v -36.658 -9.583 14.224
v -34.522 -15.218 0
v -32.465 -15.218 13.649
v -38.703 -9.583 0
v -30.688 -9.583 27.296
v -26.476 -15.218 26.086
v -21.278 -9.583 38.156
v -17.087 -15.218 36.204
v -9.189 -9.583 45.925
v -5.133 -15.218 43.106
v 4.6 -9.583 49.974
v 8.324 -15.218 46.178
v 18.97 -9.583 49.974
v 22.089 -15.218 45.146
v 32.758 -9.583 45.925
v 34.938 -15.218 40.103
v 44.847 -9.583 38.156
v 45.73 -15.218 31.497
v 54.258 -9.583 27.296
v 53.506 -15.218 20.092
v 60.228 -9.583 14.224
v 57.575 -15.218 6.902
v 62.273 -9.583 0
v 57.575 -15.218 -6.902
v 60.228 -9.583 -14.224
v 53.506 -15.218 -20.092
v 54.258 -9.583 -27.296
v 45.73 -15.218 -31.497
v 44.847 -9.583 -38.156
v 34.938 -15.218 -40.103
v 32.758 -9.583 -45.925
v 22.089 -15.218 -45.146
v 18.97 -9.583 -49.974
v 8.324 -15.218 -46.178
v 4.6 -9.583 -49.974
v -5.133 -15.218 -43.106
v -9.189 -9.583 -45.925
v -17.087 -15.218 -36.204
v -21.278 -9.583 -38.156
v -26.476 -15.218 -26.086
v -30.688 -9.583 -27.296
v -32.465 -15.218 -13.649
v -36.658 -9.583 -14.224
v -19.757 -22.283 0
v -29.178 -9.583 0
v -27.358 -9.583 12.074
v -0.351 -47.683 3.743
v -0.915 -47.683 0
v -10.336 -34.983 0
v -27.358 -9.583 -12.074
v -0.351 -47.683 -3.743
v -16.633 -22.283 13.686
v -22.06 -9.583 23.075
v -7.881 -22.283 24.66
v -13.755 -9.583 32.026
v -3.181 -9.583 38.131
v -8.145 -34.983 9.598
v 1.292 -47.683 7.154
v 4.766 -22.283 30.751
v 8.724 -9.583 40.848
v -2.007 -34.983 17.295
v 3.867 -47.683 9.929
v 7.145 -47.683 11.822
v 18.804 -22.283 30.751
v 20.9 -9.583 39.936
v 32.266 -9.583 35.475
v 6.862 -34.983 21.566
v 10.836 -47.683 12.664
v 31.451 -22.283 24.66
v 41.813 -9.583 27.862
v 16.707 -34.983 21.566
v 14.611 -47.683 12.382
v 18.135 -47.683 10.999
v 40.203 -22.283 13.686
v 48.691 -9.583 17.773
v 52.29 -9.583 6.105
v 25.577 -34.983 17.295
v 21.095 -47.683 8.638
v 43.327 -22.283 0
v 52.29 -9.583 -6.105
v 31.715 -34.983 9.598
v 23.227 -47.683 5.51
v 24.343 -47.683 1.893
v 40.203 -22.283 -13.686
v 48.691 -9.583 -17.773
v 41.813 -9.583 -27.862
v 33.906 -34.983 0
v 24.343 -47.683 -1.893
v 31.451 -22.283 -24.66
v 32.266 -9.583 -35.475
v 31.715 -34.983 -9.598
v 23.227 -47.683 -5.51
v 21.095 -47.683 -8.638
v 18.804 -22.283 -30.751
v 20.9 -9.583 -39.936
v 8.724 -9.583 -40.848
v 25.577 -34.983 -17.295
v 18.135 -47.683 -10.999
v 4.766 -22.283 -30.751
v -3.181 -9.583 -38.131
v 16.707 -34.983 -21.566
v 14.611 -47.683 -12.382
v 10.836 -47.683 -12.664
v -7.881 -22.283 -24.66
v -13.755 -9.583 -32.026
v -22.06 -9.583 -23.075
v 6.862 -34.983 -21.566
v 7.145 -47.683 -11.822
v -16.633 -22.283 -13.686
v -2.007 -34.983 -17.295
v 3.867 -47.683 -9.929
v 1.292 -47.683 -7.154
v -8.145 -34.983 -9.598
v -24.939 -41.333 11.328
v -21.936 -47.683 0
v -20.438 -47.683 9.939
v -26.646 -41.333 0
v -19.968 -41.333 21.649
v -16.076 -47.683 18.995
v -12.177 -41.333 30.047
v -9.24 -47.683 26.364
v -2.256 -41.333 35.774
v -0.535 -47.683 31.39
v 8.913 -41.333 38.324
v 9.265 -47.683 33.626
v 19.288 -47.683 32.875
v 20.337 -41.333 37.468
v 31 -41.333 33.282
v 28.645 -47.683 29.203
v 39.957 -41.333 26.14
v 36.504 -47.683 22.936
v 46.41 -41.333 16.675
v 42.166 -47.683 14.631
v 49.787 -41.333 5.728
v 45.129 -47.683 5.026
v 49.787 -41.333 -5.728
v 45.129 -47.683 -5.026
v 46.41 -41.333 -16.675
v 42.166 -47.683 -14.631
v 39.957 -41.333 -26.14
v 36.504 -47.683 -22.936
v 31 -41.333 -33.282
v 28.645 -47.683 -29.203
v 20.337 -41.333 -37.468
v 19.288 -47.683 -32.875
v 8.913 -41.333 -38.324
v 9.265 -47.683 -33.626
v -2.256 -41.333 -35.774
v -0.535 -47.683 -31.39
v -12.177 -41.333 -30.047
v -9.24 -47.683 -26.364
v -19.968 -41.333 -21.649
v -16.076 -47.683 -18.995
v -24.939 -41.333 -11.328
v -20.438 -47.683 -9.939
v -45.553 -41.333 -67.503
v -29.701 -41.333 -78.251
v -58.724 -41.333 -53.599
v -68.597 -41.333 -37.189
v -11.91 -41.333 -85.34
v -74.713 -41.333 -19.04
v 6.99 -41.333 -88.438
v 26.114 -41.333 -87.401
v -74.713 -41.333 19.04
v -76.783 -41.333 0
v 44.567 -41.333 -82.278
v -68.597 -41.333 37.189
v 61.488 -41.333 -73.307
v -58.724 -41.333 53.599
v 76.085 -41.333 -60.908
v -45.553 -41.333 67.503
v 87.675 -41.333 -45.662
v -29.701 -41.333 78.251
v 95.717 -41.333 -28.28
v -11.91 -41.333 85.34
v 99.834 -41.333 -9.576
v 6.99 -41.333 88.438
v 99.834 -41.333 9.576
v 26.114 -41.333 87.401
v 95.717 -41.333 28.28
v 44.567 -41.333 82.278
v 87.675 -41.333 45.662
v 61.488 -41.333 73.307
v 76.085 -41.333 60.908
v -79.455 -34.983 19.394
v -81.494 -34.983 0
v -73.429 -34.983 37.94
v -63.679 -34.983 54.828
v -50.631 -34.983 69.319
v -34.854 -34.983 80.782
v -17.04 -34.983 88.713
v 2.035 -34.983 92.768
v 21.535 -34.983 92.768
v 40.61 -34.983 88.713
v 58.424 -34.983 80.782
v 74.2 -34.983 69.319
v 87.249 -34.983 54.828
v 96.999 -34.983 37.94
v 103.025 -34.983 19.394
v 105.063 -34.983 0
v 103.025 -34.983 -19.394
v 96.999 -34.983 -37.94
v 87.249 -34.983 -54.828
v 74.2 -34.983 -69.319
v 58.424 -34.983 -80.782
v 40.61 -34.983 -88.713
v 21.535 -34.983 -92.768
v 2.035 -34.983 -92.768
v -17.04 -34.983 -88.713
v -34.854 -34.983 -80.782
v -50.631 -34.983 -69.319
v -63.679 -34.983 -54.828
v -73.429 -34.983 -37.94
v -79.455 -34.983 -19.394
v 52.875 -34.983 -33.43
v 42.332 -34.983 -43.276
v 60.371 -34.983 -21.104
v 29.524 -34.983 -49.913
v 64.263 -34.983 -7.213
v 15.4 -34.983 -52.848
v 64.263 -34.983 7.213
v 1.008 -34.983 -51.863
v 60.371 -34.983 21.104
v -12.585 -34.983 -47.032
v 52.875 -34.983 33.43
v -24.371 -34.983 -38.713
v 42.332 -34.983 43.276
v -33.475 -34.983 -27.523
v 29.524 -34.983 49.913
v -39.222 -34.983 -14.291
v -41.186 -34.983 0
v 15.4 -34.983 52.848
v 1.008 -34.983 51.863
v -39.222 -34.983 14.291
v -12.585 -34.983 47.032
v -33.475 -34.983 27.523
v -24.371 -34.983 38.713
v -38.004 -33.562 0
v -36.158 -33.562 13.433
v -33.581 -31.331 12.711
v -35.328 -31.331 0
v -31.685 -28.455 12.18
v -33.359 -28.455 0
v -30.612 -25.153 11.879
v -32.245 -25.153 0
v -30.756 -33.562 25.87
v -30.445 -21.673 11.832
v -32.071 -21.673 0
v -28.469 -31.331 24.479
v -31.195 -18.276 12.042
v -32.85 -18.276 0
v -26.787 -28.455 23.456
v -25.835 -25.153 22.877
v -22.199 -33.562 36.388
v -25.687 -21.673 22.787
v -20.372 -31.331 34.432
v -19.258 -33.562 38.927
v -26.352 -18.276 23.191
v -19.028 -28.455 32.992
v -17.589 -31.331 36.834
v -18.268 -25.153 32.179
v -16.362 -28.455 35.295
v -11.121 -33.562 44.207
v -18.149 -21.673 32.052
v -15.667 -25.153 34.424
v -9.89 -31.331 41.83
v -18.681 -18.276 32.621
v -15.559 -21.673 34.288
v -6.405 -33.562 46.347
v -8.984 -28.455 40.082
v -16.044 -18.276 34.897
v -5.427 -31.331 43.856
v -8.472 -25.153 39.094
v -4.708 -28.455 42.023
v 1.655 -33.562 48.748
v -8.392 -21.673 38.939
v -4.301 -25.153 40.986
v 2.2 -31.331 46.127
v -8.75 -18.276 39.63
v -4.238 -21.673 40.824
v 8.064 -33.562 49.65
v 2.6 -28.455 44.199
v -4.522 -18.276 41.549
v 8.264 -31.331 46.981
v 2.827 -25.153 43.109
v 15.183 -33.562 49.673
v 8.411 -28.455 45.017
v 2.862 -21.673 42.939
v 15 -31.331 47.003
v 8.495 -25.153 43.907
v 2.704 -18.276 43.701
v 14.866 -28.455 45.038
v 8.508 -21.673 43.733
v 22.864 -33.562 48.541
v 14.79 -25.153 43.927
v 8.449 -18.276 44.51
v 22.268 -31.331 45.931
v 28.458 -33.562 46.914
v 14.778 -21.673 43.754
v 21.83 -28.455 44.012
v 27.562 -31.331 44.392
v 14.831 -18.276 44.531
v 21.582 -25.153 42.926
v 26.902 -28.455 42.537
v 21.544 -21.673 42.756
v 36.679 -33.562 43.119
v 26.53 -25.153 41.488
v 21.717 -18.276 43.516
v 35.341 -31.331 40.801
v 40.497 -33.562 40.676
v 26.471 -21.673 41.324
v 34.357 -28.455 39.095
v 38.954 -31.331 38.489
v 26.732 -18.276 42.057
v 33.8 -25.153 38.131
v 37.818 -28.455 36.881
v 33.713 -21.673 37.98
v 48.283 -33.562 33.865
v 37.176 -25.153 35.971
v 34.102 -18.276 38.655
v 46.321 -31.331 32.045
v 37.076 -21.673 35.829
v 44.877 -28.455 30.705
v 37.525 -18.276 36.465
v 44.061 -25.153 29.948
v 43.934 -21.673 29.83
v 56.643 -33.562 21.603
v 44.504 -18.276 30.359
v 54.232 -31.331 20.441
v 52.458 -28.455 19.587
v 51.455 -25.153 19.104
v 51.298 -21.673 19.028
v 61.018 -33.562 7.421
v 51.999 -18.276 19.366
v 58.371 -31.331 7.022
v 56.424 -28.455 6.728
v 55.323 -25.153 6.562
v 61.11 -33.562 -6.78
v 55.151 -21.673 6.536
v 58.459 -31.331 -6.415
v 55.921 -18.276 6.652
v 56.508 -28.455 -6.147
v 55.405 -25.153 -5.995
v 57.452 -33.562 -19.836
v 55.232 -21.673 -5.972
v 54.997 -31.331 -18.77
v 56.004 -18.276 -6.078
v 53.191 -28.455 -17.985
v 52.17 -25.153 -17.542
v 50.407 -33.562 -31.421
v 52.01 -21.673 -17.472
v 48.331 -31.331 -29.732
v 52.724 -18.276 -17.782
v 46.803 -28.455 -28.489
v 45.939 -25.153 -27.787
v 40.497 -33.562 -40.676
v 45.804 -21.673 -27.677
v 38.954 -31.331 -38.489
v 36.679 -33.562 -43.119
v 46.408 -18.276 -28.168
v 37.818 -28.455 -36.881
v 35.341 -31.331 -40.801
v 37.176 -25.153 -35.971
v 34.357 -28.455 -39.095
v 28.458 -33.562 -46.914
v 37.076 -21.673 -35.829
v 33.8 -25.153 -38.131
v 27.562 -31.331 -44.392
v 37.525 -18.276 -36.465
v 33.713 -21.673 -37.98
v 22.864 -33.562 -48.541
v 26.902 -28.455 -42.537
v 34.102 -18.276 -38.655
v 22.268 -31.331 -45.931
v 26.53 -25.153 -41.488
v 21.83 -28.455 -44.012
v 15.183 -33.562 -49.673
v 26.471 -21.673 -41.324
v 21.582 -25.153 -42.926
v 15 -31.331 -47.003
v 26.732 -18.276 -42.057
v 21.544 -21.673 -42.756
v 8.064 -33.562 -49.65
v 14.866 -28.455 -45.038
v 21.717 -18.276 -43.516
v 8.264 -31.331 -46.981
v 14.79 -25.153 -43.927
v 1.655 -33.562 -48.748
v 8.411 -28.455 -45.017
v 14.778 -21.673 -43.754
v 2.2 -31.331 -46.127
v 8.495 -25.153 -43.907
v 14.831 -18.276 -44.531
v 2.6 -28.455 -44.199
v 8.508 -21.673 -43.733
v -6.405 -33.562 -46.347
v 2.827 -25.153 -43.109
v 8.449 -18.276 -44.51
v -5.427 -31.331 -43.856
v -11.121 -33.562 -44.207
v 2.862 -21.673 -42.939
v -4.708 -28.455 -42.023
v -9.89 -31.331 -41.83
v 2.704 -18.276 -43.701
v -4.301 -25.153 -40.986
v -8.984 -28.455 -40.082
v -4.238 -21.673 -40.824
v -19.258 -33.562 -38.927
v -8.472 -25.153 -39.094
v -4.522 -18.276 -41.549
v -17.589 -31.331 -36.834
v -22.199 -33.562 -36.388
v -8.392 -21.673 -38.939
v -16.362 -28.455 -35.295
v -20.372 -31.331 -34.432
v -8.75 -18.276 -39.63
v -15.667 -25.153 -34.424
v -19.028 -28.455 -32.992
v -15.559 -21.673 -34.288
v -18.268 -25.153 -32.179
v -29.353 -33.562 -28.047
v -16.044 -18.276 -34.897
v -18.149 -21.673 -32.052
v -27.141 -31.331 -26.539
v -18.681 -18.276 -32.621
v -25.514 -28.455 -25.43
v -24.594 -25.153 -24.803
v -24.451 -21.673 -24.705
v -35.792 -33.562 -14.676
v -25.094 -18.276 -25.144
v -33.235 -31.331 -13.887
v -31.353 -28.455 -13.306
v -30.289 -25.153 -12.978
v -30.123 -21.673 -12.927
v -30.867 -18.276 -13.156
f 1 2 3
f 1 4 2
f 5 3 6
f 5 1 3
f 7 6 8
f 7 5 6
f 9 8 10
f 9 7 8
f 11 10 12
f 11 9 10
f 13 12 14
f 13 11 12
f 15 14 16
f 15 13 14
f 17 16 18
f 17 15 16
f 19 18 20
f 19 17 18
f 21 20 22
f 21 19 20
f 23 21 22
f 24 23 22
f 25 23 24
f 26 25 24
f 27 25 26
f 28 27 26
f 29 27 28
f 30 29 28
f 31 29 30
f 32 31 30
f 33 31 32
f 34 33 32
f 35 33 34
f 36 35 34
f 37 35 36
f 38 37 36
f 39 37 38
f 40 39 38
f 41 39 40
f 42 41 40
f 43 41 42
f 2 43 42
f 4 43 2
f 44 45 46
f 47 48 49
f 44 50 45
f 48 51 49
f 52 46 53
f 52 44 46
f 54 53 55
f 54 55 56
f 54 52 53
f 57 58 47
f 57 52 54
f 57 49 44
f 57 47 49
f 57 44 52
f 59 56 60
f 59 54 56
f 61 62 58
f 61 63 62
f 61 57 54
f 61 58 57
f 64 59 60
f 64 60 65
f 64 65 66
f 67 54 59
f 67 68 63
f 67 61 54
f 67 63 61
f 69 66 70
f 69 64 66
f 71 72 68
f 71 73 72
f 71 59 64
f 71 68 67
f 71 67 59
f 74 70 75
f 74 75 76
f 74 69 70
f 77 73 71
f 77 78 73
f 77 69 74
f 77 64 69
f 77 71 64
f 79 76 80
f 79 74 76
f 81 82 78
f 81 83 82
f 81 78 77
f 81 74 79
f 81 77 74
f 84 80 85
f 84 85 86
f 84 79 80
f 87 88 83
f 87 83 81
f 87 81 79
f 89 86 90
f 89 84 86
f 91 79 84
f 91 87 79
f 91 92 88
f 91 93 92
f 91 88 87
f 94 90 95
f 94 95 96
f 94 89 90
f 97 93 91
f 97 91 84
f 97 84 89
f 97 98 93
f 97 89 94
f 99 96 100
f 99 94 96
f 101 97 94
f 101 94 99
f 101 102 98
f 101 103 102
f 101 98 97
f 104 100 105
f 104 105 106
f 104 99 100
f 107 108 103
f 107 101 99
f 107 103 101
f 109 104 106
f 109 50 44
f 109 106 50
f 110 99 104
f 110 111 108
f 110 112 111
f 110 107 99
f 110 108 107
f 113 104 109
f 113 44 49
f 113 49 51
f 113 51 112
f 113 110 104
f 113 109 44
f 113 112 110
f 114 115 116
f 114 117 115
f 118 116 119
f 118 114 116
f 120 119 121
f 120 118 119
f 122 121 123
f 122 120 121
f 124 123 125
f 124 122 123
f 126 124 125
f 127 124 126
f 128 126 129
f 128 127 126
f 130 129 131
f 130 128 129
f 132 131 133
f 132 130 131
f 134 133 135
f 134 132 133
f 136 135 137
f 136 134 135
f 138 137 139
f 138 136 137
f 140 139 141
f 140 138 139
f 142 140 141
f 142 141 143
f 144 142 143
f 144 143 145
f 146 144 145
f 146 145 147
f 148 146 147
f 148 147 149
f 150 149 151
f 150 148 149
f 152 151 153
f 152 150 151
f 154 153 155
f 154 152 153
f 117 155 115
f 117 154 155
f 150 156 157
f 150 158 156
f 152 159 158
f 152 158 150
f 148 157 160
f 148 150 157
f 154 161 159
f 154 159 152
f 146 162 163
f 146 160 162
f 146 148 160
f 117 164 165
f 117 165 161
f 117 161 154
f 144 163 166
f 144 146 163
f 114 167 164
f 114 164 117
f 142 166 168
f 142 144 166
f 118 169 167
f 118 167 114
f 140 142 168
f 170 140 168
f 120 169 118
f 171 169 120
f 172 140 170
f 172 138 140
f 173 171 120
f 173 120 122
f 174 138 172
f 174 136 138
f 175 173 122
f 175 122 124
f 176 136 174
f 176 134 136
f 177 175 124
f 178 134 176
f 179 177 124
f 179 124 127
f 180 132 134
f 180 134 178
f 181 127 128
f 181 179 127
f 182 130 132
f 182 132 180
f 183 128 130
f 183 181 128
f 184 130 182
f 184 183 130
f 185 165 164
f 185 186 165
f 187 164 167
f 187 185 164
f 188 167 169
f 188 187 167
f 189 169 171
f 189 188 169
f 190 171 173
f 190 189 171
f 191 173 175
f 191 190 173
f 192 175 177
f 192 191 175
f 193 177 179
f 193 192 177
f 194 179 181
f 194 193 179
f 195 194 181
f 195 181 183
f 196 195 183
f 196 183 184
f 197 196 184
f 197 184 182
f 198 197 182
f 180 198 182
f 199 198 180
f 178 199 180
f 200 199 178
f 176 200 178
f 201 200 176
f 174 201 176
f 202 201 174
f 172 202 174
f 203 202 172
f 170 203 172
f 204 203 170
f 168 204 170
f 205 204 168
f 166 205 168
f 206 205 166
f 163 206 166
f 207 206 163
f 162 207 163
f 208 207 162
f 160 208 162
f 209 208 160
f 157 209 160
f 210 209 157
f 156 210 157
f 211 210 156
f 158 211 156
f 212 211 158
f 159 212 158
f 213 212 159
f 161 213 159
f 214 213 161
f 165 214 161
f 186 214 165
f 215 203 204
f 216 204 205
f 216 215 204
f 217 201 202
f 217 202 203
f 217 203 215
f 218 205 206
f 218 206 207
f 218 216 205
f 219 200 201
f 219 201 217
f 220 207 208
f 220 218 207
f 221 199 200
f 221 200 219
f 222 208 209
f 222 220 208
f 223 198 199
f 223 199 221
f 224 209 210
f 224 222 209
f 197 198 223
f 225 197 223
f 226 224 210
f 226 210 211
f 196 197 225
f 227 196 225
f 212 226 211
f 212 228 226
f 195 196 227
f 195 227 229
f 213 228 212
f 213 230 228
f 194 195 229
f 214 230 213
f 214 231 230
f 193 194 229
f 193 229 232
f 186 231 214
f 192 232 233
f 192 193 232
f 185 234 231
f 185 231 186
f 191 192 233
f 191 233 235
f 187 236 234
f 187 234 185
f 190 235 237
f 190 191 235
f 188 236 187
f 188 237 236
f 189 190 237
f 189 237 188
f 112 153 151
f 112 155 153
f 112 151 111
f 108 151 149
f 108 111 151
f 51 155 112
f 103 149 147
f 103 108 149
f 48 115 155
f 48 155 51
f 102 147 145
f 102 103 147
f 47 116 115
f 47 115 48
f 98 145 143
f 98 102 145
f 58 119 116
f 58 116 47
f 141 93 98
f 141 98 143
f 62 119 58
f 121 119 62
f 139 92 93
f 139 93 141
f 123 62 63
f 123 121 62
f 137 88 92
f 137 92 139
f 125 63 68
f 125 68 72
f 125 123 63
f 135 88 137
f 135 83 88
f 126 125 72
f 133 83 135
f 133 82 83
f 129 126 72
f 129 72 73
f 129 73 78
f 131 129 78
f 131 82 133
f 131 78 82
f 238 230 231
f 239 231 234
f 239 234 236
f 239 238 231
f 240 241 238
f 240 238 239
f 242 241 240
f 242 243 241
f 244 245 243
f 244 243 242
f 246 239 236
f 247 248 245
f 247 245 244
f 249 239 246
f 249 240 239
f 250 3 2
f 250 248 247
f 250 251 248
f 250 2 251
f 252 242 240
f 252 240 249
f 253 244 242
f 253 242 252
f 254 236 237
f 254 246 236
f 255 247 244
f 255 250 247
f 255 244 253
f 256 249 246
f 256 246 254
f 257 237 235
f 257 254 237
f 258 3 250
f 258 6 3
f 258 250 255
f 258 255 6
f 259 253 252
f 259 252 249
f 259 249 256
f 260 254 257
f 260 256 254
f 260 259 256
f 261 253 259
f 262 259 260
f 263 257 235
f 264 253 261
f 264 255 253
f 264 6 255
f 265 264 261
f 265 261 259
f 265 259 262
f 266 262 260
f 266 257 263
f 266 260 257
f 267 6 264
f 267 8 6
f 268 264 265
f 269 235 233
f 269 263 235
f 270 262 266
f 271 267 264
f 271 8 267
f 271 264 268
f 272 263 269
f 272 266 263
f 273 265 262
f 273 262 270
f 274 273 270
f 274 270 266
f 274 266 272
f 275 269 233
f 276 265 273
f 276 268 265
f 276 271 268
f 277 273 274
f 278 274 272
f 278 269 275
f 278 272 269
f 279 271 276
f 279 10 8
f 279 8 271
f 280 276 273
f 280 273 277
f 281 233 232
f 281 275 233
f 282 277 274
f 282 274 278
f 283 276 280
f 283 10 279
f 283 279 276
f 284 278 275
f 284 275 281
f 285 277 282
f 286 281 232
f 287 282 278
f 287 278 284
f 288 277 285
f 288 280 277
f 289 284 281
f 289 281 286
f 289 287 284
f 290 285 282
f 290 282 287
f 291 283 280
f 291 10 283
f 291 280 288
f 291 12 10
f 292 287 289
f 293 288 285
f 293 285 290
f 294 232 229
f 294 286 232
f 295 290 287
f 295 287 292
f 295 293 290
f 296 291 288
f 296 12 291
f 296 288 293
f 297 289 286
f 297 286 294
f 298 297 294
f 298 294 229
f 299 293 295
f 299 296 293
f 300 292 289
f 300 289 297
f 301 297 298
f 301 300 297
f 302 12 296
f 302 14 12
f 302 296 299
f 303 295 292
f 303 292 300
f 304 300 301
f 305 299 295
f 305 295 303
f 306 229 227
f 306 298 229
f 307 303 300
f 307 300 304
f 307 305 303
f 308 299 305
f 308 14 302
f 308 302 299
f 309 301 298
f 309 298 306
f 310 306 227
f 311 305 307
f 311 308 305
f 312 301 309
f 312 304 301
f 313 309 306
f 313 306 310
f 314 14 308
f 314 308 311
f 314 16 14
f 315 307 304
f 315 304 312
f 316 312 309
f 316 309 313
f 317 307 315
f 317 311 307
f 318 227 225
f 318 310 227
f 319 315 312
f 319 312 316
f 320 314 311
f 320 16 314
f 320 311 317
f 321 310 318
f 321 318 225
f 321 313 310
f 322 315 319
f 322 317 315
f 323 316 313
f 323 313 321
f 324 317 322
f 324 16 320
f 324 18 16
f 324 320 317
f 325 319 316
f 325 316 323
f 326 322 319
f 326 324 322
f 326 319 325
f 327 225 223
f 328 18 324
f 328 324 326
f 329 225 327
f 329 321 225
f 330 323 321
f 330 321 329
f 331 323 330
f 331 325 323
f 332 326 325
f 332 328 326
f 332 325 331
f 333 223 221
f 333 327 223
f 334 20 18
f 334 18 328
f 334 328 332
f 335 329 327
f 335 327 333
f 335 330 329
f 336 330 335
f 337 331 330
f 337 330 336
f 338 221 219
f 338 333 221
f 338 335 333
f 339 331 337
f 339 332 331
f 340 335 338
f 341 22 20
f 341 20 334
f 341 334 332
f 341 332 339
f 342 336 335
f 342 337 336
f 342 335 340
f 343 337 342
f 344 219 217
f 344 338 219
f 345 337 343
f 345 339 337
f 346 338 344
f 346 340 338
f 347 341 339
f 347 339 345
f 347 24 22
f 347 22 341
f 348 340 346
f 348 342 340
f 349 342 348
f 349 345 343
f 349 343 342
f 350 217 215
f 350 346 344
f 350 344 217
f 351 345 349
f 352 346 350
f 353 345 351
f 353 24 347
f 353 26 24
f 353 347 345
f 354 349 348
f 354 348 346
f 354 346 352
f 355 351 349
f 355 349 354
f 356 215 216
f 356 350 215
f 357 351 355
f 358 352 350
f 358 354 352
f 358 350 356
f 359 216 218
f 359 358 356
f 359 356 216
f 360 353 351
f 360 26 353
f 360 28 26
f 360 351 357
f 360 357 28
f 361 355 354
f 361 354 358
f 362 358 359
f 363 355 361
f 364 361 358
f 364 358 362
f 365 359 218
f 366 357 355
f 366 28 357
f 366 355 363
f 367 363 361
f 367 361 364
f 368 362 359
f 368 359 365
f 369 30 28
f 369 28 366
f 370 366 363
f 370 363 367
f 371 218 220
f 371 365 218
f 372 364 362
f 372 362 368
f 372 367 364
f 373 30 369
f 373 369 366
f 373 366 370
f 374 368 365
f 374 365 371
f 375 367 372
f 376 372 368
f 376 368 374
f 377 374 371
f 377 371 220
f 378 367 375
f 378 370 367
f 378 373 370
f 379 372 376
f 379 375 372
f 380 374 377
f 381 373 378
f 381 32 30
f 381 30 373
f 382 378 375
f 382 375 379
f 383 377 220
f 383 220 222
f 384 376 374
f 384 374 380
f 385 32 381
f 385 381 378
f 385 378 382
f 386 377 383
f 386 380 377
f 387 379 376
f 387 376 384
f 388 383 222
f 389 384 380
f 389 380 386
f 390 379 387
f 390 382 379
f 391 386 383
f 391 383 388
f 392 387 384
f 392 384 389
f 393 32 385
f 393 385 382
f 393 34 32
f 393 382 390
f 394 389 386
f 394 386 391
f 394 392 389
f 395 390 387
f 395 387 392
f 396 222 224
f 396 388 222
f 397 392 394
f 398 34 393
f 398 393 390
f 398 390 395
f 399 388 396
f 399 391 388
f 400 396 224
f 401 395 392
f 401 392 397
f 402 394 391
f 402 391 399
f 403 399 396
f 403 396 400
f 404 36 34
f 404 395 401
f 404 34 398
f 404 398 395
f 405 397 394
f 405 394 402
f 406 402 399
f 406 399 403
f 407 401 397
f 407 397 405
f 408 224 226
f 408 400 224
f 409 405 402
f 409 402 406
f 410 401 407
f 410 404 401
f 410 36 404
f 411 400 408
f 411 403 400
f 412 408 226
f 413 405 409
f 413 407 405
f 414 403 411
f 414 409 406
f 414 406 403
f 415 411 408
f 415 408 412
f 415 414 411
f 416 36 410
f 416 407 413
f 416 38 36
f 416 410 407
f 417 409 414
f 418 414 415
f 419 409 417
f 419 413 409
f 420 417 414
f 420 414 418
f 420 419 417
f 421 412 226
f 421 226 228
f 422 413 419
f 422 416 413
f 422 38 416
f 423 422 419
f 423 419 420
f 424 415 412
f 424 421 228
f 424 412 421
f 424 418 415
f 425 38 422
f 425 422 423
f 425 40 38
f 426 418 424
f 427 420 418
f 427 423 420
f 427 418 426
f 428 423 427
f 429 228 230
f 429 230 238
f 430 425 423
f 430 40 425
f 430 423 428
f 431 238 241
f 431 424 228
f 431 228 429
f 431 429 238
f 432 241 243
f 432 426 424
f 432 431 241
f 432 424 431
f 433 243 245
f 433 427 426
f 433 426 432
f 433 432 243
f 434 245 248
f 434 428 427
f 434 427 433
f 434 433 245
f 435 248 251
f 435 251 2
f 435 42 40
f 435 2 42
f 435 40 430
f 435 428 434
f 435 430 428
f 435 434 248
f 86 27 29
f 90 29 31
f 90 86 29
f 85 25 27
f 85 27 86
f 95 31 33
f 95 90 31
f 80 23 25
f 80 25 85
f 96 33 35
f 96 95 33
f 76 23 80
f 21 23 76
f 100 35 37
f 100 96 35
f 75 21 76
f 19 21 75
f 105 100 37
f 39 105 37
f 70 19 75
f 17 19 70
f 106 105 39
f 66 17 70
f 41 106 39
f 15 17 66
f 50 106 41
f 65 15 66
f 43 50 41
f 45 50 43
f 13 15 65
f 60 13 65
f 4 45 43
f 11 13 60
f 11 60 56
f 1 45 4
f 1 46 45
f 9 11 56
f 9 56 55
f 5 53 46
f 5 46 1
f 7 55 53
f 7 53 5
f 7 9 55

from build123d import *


with BuildPart() as part:
    # Sketch1 → Revolve1 (revolve)
    with BuildSketch(Plane.XY):
        with BuildLine():
            Line((-0.915133072, -47.682722084), (-21.935744519, -47.682722084))
            Line((-21.935744519, -47.682722084), (-26.646227047, -41.332722084))
            Line((-26.646227047, -41.332722084), (-76.783206885, -41.332722084))
            Line((-76.783206885, -41.332722084), (-81.493689413, -34.982722084))
            Line((-81.493689413, -34.982722084), (-41.186438296, -34.982722084))
            ThreePointArc((-41.186438296, -34.982722084), (-32.688024732, -26.842579107), (-34.522388815, -15.218463262))
            Line((-34.522388815, -15.218463262), (-38.70302824, -9.582722084))
            Line((-38.70302824, -9.582722084), (-29.17802824, -9.582722084))
            Line((-29.17802824, -9.582722084), (-0.915133072, -47.682722084))
        make_face()
    revolve(axis=Axis((11.784866928, -49.703724191, 0), (0, 1, 0)))


solid = part.part
